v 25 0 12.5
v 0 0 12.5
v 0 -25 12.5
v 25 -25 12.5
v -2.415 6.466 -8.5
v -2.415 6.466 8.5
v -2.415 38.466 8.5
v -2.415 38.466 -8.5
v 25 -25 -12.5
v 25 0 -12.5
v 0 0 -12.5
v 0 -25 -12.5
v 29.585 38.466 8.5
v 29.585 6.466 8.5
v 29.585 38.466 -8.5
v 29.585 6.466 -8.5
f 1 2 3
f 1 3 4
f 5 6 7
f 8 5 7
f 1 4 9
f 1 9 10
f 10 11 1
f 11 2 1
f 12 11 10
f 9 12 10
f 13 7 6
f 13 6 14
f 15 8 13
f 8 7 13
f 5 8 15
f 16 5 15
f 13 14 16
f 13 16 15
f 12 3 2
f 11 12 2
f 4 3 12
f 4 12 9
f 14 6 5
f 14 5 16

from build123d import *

# Parameters (mm, degrees)
F0_W          = 25
F0_H          = 25
F1_DEPTH      = 12.5
F1_DEPTH_BACK = 12.5
F2_W          = 32
F2_H          = 32
F3_DEPTH      = 8.5
F3_DEPTH_BACK = 8.5


with BuildPart() as f1:
    # F0 (on Top) → F1 (new body, two sides)
    with BuildSketch(Plane.XY) as f1_sk:
        with Locations((12.5, -12.5)):
            Rectangle(F0_W, F0_H)
    extrude(amount=F1_DEPTH)
    extrude(f1_sk.sketch, amount=-F1_DEPTH_BACK)


with BuildPart() as f3:
    # F2 (on Top) → F3 (new body, two sides)
    with BuildSketch(Plane.XY) as f3_sk:
        with Locations((13.585268, 22.46623)):
            Rectangle(F2_W, F2_H)
    extrude(amount=F3_DEPTH)
    extrude(f3_sk.sketch, amount=-F3_DEPTH_BACK)


solid = Compound([f1.part, f3.part])
